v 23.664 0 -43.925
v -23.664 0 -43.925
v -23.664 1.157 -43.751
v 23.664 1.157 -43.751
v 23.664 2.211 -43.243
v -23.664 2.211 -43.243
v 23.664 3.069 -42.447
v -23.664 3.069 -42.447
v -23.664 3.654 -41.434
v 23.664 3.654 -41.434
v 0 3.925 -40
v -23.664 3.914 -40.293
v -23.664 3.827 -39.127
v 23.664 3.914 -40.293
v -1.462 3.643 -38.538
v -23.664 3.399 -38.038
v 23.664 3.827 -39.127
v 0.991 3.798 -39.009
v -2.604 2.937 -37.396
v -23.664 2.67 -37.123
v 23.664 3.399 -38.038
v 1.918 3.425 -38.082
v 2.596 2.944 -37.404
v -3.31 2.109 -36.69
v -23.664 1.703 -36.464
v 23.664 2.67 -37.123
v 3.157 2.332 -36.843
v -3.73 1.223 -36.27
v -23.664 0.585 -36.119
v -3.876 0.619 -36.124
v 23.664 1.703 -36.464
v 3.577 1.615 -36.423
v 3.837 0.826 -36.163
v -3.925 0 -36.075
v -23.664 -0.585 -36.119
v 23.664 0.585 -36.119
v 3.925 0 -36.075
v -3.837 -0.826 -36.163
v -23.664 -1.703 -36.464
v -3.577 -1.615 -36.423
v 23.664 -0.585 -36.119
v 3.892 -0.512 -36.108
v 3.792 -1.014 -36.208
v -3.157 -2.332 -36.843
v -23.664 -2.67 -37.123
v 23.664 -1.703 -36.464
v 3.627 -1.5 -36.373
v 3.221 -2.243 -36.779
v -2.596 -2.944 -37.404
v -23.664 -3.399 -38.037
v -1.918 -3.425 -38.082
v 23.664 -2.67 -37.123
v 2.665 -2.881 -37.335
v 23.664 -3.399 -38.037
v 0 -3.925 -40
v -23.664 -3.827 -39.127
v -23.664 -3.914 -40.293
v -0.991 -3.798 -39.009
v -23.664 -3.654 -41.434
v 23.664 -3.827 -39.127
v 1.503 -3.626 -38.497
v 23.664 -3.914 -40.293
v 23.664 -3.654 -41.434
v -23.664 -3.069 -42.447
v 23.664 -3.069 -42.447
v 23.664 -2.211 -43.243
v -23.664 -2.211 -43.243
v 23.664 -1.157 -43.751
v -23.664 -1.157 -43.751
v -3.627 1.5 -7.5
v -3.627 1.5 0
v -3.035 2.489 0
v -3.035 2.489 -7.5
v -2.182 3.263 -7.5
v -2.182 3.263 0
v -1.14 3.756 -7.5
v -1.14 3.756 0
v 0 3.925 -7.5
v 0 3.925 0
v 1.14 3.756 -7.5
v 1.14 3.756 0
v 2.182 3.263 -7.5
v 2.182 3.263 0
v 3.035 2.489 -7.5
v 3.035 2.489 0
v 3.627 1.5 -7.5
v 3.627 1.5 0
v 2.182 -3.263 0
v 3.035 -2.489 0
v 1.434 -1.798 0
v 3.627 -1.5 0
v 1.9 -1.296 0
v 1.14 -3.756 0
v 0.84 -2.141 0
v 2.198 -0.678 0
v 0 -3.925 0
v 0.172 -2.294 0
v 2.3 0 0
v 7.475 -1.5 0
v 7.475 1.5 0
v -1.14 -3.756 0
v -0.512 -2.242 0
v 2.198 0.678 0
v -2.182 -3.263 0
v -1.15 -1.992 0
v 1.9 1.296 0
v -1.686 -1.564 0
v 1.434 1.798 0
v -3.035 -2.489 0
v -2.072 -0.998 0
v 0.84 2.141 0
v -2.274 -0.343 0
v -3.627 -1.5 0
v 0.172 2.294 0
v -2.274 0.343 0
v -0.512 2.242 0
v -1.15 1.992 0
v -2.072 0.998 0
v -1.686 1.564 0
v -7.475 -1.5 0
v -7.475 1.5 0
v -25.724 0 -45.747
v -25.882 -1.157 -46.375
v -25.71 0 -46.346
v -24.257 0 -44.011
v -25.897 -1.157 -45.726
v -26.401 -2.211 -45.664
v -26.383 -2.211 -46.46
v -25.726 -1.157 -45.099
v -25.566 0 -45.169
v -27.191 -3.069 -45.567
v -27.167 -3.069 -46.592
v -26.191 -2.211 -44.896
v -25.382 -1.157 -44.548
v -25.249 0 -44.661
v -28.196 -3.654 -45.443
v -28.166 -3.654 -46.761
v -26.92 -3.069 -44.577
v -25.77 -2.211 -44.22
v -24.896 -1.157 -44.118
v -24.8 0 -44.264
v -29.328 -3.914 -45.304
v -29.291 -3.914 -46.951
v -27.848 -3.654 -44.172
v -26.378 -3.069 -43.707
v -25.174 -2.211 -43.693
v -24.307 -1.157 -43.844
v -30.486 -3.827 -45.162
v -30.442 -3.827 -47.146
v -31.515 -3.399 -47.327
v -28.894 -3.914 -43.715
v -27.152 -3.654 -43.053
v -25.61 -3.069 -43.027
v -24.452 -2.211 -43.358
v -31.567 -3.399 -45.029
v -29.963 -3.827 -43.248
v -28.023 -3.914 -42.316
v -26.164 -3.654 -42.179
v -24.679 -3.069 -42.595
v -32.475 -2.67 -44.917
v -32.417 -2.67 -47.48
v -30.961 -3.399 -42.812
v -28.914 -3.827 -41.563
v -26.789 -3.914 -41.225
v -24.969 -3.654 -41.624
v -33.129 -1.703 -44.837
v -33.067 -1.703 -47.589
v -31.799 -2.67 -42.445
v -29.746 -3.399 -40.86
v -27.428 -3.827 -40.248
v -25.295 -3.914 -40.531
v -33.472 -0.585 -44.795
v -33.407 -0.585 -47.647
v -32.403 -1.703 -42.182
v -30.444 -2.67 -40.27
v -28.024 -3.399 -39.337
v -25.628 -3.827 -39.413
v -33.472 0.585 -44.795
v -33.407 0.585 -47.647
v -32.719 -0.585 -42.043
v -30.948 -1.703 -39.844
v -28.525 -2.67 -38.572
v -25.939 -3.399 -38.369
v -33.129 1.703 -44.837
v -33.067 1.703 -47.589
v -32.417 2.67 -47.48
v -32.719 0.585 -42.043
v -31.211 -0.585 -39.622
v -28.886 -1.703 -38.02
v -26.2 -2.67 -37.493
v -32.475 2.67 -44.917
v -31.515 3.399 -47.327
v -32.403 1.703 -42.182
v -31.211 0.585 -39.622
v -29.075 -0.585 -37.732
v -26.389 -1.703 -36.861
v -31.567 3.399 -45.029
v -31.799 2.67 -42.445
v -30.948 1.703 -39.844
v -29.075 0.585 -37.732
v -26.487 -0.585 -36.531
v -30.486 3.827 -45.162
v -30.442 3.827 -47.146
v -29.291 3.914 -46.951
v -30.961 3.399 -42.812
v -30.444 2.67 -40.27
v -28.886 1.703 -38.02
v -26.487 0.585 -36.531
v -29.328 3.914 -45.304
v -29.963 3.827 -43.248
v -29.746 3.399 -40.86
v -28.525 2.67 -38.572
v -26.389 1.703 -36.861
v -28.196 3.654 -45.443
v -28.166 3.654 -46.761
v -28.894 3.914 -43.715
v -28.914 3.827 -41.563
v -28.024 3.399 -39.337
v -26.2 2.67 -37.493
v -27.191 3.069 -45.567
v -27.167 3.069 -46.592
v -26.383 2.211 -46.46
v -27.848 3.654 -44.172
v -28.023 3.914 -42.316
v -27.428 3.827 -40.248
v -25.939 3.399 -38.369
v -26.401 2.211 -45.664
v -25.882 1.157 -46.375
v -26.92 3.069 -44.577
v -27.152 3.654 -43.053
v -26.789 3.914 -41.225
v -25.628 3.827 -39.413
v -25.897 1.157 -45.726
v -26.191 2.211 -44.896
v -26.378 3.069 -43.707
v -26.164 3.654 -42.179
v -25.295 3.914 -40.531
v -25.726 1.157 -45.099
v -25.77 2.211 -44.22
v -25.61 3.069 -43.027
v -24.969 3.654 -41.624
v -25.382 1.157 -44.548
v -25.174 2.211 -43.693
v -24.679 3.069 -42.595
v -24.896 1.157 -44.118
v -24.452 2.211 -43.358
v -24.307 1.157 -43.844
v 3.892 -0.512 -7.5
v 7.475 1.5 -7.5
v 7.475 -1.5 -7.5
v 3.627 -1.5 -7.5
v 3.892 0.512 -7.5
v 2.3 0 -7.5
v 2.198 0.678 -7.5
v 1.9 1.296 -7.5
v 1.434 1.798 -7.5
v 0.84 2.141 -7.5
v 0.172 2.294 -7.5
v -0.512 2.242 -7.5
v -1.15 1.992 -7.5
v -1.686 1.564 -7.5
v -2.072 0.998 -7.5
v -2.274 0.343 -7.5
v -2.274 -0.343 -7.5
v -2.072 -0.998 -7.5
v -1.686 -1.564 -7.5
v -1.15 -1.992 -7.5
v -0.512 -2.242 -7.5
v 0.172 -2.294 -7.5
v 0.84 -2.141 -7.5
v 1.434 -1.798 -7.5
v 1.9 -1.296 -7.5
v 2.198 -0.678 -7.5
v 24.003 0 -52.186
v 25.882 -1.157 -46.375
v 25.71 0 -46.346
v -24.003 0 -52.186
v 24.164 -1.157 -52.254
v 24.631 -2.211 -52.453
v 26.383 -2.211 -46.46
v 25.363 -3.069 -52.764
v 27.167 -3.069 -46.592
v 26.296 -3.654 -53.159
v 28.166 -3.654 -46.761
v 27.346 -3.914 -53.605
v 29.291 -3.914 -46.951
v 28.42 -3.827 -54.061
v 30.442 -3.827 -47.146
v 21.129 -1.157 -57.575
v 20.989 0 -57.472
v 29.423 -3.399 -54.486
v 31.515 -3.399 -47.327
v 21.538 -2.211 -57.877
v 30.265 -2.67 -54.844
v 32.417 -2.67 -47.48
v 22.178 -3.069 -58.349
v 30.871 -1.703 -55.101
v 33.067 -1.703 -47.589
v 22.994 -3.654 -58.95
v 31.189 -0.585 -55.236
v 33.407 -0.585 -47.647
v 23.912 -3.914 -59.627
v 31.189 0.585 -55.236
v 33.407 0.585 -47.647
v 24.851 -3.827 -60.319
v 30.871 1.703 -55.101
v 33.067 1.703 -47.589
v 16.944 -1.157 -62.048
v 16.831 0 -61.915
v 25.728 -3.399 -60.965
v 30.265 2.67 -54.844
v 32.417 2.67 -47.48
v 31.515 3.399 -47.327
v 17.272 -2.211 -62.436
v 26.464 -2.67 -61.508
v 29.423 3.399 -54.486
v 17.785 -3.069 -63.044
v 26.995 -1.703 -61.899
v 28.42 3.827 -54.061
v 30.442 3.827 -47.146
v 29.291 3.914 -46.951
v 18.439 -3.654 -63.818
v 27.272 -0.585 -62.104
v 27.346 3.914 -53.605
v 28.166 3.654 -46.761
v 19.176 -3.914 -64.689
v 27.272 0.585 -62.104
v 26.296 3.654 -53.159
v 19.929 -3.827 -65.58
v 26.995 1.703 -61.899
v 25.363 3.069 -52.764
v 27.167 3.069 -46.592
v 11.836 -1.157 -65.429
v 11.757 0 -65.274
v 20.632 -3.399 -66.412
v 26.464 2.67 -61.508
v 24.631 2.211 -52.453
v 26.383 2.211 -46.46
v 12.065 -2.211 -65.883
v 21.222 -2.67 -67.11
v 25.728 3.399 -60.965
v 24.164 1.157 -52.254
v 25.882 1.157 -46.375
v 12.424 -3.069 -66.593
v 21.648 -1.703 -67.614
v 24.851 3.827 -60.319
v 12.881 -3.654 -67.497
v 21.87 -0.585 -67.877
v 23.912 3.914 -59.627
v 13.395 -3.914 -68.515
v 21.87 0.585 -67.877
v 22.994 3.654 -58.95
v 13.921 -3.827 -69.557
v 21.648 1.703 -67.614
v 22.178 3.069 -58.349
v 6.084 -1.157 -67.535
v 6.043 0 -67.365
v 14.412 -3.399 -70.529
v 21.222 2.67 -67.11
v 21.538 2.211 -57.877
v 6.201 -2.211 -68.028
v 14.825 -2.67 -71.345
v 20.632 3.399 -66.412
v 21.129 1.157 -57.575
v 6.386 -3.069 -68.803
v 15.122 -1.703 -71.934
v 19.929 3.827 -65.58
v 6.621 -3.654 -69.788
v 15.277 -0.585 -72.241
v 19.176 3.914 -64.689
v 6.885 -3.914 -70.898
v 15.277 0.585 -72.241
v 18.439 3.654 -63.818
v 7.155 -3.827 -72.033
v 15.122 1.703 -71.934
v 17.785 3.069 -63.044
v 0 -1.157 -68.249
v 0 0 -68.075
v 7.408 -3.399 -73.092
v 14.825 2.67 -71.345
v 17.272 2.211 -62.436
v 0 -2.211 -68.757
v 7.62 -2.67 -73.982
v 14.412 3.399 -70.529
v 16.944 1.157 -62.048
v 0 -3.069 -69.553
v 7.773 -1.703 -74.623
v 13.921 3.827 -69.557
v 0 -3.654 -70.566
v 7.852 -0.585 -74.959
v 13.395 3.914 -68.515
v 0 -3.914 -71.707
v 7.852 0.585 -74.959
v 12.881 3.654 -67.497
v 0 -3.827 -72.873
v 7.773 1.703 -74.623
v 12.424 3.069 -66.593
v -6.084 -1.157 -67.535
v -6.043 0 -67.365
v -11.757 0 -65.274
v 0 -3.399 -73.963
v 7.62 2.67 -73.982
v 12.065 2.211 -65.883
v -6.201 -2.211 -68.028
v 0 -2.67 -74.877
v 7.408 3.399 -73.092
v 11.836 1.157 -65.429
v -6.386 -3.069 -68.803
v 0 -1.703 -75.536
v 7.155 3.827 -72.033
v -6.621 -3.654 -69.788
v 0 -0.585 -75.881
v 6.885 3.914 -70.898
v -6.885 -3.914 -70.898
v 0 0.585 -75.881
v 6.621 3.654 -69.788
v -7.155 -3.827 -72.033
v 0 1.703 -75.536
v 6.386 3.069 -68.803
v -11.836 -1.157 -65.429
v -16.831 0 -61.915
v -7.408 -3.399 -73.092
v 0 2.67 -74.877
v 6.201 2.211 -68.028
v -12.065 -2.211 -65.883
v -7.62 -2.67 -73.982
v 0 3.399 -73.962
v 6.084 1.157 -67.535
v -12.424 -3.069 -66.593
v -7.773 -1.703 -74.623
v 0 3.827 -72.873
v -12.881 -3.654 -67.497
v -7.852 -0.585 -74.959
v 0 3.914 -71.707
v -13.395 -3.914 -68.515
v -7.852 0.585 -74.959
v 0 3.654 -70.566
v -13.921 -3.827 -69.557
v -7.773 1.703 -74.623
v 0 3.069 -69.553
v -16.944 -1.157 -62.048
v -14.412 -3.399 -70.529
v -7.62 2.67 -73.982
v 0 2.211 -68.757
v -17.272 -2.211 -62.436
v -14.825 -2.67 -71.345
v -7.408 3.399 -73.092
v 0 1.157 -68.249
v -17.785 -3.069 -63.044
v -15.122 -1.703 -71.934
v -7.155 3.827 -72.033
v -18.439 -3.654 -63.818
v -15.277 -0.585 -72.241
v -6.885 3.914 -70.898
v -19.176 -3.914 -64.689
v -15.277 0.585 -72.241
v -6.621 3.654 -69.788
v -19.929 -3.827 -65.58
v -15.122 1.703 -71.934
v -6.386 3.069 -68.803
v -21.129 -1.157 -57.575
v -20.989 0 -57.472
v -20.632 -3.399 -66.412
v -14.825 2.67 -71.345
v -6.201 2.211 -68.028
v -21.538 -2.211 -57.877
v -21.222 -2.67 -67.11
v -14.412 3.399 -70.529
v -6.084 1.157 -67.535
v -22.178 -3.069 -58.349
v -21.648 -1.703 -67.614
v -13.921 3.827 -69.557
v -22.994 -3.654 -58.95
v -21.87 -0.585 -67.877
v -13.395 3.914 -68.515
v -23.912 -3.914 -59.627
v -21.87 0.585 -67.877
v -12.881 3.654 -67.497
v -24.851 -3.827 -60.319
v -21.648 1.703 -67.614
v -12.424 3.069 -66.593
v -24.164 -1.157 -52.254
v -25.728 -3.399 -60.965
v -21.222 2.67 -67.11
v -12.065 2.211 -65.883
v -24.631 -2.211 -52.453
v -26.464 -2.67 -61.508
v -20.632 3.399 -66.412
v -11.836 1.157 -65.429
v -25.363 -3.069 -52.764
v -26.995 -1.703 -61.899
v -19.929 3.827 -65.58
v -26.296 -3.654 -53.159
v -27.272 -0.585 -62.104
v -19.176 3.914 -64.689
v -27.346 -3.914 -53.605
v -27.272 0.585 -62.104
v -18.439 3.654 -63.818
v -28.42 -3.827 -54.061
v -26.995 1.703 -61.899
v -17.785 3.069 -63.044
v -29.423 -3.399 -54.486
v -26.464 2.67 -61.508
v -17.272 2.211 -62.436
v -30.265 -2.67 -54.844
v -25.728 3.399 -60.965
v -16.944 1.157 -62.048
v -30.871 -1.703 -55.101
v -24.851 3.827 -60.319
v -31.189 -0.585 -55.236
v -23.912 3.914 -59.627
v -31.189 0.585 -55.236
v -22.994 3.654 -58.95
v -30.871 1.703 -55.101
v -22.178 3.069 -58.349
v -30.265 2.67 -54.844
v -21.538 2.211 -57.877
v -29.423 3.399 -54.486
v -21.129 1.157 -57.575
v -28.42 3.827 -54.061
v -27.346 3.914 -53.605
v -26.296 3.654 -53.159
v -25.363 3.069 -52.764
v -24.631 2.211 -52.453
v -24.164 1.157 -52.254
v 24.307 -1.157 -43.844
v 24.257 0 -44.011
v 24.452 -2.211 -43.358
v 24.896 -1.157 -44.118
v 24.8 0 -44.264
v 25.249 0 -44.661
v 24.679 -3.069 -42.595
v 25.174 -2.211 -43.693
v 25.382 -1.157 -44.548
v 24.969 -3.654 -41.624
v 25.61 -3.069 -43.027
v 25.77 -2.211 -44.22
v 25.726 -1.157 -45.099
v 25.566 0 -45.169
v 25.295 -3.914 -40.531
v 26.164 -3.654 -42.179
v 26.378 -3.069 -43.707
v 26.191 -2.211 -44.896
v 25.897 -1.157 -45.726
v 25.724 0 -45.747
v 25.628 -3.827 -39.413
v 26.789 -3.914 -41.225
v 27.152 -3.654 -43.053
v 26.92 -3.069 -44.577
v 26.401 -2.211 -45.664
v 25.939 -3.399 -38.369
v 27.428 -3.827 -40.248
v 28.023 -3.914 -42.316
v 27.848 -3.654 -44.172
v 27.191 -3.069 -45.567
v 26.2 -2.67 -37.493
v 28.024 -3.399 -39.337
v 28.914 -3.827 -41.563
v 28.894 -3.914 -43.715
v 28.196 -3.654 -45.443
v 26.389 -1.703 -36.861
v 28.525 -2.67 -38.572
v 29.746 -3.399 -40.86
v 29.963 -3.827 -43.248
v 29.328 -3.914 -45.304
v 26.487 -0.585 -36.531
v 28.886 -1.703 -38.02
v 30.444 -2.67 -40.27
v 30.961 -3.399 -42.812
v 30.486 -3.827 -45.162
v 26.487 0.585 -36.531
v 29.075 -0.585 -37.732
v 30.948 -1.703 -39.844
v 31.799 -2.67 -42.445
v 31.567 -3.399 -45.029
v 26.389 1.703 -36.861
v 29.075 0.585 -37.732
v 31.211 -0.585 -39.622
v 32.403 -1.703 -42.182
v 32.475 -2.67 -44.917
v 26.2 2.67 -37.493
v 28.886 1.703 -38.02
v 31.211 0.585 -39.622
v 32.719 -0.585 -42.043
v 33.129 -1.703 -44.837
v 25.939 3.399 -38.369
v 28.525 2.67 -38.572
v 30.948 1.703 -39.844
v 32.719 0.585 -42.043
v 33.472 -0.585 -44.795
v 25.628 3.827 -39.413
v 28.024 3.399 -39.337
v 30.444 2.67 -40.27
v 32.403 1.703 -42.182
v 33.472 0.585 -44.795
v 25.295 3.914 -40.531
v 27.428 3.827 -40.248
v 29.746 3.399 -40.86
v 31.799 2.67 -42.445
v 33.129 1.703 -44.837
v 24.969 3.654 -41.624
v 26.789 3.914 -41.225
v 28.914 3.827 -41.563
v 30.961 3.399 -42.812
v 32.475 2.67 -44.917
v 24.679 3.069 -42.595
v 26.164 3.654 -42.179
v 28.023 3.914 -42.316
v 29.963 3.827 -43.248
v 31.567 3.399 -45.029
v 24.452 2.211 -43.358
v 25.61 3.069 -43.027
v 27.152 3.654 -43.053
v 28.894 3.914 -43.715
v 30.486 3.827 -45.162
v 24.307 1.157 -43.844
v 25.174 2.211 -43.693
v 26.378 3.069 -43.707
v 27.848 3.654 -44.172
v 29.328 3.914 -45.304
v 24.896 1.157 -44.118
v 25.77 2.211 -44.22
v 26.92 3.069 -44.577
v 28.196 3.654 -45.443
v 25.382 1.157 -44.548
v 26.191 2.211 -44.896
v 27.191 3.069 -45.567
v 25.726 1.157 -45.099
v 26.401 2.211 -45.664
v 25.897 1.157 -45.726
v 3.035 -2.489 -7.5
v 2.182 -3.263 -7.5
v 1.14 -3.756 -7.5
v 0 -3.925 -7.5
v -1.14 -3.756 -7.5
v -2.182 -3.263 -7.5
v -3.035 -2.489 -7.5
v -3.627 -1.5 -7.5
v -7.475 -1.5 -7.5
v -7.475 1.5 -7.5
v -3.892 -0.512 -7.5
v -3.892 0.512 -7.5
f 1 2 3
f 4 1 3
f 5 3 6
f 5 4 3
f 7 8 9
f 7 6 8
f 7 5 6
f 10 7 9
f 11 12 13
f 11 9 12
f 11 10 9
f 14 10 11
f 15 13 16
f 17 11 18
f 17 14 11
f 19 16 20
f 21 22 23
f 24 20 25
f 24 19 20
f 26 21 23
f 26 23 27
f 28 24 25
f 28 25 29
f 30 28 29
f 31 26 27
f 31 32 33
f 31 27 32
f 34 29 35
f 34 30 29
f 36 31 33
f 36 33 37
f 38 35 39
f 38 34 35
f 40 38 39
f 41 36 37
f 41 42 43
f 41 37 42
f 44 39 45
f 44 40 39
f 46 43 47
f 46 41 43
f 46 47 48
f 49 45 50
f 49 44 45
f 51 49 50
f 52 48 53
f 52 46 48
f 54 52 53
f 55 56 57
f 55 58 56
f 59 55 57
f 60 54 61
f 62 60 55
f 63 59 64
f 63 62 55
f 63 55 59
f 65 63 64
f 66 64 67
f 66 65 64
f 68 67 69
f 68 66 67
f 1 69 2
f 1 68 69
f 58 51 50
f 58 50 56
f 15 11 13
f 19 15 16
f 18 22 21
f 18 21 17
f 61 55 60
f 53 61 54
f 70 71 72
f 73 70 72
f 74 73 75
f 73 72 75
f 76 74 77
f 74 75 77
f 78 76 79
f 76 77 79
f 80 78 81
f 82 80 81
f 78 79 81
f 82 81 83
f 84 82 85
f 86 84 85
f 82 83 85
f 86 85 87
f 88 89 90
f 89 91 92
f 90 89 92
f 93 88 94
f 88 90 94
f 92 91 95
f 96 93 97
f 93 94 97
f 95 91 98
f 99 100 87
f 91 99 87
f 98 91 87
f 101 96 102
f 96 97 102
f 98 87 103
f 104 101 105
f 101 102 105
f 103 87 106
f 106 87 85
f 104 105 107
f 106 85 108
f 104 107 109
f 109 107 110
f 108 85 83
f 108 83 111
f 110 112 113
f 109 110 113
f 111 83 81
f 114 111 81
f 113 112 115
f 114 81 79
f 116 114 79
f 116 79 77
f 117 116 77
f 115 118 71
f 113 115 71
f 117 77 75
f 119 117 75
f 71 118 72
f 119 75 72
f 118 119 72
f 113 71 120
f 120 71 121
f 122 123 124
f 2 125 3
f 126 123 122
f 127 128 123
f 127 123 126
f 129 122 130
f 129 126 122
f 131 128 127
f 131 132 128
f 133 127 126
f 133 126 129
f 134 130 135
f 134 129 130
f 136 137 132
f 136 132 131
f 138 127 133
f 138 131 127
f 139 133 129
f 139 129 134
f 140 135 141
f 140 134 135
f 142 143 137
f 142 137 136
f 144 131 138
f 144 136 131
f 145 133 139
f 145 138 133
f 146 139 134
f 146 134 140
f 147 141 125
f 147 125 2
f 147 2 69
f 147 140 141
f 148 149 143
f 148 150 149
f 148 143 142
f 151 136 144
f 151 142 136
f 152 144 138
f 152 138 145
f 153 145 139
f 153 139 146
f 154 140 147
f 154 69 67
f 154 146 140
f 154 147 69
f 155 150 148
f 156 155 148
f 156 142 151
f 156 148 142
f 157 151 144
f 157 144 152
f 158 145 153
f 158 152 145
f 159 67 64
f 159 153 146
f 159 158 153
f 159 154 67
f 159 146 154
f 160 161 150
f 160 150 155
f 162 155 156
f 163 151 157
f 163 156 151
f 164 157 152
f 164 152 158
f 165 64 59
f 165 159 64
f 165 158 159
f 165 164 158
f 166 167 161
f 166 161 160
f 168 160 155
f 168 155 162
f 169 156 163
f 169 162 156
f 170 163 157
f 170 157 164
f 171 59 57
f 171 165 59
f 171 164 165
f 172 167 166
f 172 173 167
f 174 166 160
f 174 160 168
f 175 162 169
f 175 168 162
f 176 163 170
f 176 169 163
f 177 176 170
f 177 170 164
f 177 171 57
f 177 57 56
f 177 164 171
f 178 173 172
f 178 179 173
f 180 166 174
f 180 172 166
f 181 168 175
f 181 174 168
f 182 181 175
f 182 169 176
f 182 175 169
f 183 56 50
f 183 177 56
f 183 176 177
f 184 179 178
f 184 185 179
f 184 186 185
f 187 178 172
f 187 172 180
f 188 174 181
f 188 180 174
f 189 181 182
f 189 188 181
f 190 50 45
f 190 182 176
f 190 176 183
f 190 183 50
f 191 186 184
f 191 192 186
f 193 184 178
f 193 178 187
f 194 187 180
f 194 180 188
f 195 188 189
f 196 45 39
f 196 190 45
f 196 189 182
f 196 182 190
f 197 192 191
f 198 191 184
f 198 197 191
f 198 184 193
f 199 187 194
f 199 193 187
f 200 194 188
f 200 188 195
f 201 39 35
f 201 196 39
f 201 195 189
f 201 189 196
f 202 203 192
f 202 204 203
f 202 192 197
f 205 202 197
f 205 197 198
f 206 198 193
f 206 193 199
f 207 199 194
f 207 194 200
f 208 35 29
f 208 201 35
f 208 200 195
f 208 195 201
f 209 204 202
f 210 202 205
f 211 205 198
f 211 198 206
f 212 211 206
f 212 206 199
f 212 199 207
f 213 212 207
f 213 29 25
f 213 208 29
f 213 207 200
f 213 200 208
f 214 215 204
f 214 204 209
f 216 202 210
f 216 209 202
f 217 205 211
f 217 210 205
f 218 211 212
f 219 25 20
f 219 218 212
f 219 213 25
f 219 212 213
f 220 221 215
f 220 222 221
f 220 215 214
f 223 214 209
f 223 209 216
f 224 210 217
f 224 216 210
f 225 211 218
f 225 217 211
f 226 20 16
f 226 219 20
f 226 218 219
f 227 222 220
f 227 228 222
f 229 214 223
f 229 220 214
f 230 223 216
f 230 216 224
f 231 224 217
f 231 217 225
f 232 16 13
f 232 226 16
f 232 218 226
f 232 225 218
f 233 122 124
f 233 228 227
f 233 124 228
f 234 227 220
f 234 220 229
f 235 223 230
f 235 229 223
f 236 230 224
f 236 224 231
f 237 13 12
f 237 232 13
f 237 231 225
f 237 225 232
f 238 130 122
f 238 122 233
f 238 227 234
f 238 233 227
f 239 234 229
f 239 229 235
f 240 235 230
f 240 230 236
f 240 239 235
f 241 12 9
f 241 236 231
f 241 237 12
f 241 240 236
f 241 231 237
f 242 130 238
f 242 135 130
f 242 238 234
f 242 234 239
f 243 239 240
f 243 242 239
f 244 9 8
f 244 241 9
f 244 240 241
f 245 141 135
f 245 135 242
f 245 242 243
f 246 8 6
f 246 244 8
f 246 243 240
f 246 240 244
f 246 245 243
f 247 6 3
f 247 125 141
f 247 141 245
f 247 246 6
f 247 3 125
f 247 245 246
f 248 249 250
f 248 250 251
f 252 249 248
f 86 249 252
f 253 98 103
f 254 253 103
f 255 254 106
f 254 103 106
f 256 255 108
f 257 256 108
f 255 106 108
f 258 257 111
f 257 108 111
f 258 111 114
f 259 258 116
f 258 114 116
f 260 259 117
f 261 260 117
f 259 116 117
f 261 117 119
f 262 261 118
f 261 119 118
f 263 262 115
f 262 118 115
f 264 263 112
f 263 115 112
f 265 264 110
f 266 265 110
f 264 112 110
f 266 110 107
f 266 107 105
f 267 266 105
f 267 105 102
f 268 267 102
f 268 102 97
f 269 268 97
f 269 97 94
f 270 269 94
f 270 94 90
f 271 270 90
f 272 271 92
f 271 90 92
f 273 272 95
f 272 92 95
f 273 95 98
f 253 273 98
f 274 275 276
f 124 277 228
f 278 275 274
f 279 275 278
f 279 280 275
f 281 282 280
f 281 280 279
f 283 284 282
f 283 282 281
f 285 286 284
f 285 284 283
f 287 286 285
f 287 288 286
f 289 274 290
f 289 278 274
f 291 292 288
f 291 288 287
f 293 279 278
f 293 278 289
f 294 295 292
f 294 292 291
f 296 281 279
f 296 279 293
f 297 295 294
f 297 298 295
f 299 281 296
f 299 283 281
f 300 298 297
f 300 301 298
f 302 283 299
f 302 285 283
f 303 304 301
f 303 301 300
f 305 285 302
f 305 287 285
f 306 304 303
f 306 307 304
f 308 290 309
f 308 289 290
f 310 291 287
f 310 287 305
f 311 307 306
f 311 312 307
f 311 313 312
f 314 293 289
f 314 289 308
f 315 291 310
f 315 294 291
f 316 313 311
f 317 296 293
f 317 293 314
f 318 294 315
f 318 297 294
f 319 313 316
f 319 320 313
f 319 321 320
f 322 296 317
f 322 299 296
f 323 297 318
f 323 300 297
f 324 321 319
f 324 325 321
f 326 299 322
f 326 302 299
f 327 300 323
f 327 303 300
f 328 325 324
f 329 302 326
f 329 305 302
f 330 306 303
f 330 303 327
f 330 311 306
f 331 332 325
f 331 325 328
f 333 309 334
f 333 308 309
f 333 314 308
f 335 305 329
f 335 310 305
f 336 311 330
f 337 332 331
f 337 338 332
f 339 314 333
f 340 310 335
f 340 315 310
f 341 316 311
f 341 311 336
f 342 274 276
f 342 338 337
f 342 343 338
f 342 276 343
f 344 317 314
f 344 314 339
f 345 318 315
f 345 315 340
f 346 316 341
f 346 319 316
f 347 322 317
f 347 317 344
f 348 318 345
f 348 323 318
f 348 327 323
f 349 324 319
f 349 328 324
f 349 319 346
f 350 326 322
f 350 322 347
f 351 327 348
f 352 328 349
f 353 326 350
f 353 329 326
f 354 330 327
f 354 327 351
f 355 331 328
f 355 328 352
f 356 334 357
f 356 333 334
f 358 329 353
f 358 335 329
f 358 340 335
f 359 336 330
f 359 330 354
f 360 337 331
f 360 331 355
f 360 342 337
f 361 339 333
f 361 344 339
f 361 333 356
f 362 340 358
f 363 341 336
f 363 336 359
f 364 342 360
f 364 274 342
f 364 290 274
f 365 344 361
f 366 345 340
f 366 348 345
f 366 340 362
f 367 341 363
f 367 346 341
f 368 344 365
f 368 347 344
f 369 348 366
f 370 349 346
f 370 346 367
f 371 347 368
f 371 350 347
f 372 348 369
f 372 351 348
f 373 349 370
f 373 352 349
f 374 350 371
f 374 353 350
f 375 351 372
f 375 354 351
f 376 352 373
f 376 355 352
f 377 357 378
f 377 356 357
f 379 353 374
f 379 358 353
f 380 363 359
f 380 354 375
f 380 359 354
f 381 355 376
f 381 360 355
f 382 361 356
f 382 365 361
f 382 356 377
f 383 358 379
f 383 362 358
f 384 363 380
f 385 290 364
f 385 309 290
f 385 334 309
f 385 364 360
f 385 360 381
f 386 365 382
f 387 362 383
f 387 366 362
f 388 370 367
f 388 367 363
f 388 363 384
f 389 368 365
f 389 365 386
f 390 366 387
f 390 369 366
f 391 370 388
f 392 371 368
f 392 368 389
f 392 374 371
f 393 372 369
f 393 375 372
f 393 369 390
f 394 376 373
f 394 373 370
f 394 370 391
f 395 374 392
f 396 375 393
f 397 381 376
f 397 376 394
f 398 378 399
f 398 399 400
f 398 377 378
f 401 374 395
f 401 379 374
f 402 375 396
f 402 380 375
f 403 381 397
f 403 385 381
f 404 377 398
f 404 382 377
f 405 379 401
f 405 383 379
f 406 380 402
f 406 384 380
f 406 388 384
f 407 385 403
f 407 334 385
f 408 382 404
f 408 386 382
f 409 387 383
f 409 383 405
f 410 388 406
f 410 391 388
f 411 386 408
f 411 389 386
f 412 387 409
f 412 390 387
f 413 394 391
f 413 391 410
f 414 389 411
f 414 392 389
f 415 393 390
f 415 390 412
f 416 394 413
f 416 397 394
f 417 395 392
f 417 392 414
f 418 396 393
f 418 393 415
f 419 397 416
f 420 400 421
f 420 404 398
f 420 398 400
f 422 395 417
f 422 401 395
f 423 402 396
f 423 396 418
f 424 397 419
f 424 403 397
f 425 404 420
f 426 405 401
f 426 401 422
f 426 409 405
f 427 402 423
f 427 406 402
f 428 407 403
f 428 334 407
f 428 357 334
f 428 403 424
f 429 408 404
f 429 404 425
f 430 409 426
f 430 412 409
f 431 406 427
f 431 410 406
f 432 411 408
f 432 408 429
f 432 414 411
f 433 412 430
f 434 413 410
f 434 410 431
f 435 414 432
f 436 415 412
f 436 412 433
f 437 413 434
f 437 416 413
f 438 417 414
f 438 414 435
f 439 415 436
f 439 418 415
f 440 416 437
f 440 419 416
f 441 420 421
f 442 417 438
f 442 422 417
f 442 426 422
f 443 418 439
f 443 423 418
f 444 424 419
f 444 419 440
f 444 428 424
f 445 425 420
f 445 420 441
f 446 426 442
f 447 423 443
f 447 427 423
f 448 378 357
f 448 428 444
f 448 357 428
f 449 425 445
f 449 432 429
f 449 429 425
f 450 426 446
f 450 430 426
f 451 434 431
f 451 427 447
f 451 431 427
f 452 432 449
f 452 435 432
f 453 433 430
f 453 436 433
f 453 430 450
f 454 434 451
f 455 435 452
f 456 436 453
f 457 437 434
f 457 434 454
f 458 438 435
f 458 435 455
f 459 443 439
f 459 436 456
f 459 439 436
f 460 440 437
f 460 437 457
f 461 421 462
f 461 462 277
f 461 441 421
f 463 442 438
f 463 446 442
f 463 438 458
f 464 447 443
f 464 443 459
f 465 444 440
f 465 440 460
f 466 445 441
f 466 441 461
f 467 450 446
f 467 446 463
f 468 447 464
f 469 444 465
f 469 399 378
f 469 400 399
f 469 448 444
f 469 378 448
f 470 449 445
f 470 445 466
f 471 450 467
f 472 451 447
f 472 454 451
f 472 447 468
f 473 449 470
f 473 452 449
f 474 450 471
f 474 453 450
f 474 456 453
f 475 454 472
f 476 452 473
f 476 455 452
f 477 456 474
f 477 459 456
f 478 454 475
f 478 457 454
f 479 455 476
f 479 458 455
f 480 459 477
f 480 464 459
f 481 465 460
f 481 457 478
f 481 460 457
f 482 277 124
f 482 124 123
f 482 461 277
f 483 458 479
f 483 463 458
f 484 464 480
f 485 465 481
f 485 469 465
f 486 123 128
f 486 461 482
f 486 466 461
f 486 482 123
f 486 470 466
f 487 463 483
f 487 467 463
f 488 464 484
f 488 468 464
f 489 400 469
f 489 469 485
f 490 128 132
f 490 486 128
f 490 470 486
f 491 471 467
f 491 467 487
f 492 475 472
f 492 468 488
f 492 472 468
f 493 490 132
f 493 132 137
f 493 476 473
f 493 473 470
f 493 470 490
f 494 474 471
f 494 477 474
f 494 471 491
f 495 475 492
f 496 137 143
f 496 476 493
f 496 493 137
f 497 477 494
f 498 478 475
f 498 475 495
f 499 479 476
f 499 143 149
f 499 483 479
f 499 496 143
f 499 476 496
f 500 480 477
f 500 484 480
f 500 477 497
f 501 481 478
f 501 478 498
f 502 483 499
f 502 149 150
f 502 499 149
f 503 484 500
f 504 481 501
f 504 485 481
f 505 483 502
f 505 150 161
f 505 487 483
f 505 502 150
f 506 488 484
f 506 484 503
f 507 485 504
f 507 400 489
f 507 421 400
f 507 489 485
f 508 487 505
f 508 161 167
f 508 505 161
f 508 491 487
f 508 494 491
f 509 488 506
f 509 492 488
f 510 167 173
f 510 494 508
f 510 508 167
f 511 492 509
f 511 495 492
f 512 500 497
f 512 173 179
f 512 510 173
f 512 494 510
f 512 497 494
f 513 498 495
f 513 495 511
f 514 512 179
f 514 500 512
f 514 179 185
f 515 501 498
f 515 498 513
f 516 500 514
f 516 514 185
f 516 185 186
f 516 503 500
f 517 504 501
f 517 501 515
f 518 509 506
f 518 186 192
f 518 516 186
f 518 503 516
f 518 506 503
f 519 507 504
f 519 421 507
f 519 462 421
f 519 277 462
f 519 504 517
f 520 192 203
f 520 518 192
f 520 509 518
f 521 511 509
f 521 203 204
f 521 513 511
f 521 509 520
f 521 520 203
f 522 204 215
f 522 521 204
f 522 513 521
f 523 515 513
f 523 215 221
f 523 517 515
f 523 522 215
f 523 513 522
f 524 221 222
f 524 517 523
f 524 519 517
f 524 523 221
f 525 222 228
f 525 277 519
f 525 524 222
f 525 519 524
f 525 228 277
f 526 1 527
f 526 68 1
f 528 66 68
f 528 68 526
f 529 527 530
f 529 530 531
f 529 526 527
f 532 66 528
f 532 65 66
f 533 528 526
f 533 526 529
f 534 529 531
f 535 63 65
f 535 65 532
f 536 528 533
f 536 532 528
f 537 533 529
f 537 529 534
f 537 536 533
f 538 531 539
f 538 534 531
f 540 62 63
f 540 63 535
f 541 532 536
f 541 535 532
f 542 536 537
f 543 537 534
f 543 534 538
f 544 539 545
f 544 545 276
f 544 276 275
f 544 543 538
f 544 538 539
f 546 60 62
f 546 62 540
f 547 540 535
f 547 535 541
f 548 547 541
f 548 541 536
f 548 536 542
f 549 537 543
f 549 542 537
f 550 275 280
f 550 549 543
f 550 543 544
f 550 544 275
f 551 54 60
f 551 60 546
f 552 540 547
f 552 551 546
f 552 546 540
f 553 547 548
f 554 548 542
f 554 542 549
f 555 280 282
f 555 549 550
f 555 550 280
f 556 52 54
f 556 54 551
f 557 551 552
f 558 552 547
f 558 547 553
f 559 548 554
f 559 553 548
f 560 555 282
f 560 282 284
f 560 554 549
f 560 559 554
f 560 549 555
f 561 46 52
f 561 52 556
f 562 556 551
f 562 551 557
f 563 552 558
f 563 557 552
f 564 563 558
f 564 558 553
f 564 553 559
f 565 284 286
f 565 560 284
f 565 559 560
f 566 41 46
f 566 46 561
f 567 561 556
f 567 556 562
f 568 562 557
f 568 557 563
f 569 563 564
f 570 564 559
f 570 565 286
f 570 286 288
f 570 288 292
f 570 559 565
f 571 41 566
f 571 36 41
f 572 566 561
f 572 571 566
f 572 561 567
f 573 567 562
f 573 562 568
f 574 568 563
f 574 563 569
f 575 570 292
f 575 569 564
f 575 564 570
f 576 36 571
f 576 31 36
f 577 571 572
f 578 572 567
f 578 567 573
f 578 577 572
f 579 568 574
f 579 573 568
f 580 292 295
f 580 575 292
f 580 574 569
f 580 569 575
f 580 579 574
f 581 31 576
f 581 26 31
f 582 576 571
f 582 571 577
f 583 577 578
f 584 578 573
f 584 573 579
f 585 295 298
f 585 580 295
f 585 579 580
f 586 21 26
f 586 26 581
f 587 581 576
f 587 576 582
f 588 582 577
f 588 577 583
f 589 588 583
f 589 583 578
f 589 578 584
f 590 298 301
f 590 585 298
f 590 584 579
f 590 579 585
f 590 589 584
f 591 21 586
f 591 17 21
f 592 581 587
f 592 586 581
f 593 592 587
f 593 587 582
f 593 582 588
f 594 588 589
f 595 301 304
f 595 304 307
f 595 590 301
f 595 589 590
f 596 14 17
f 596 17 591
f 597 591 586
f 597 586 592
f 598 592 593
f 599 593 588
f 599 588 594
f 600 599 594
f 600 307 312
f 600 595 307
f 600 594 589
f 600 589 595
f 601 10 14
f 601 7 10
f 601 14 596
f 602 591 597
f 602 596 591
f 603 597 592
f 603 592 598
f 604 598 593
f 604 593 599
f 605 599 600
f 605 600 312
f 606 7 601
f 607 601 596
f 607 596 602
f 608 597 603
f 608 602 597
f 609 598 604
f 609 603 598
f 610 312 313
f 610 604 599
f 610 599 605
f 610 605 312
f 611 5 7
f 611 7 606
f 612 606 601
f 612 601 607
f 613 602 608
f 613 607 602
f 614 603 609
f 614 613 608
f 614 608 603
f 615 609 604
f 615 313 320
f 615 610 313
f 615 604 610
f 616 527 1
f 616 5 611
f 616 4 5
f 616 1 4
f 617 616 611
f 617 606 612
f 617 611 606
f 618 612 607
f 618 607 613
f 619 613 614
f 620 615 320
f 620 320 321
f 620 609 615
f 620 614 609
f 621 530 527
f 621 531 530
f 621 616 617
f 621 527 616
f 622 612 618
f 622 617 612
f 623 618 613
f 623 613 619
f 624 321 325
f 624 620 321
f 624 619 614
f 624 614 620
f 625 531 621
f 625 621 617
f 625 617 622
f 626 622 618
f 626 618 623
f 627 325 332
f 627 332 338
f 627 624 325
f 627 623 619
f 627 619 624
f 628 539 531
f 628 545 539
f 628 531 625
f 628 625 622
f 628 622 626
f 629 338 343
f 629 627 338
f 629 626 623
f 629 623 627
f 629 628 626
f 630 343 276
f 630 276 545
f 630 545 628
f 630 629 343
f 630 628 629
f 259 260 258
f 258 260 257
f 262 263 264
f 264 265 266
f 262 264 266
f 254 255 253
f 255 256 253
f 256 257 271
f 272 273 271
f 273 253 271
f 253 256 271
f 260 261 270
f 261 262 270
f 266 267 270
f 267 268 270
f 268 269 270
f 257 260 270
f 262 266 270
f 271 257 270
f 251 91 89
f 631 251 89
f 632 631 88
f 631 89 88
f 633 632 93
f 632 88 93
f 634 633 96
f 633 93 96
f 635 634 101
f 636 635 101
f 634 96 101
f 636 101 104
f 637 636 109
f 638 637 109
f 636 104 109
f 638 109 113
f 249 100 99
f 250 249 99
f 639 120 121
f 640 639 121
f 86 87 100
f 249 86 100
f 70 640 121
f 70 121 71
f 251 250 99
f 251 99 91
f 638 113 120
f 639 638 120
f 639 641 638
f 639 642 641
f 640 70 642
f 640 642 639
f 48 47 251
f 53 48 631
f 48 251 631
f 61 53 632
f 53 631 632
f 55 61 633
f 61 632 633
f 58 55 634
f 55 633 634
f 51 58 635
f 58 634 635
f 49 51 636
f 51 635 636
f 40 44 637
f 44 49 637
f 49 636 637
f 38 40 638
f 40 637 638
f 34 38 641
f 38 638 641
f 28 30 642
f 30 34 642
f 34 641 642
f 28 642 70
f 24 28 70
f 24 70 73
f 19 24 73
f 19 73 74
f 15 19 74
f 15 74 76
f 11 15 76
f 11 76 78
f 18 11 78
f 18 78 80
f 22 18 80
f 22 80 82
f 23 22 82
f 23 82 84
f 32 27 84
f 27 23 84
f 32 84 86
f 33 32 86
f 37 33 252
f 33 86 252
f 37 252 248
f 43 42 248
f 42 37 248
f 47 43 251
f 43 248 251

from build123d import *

# Parameters (mm, degrees)
CROQUIS1_R              = 2.3
SALIENTE_EXTRUIR1_DEPTH = 7.5
CROQUIS4_R              = 3.925
SALIENTE_EXTRUIR3_DEPTH = 32.5
CROQUIS5_R              = 3.925


with BuildPart() as part:
    # Croquis1 → Saliente-Extruir1 (new body)
    with BuildSketch(Plane.XY):
        with BuildLine():
            Line((3.627068375, 1.5), (7.475, 1.5))
            Line((7.475, 1.5), (7.475, -1.5))
            Line((7.475, -1.5), (3.627068375, -1.5))
            ThreePointArc((3.627068375, -1.5), (0, -3.925), (-3.627068375, -1.5))
            Line((-3.627068375, -1.5), (-7.475, -1.5))
            Line((-7.475, -1.5), (-7.475, 1.5))
            Line((-7.475, 1.5), (-3.627068375, 1.5))
            ThreePointArc((-3.627068375, 1.5), (0, 3.925), (3.627068375, 1.5))
        make_face()
        Circle(CROQUIS1_R, mode=Mode.SUBTRACT)
    extrude(amount=-SALIENTE_EXTRUIR1_DEPTH)

    # Croquis4 → Saliente-Extruir3 (add)
    with BuildSketch(Plane(origin=(0, 0, -7.5), x_dir=(-1, 0, 0), z_dir=(0, 0, -1))):
        with Locations(Location((0, 0, 0), (0, 0, 202.467889888))):
            Circle(CROQUIS4_R)
    extrude(amount=SALIENTE_EXTRUIR3_DEPTH)

    # Barrer2: sweep along a path in Croquis6
    with BuildLine(Plane(origin=(0, 0, 0), x_dir=(1, 0, 0), z_dir=(0, 1, 0))) as barrer2_path:
        Line((0, 40), (23.664319132, 40))
        ThreePointArc((23.664319132, 40), (28.246894827, 42.127016654), (29.580398915, 47))
        ThreePointArc((29.580398915, 47), (0, 72), (-29.580398915, 47))
        ThreePointArc((-29.580398915, 47), (-28.246894827, 42.127016654), (-23.664319132, 40))
        Line((-23.664319132, 40), (0, 40))
    # Croquis5 → Barrer2 (sweep)
    with BuildSketch(Plane(origin=(0, 0, 0), x_dir=(0, 0, -1), z_dir=(1, 0, 0))):
        with Locations((40, 0)):
            Circle(CROQUIS5_R)
    sweep(path=barrer2_path.line)


solid = part.part
